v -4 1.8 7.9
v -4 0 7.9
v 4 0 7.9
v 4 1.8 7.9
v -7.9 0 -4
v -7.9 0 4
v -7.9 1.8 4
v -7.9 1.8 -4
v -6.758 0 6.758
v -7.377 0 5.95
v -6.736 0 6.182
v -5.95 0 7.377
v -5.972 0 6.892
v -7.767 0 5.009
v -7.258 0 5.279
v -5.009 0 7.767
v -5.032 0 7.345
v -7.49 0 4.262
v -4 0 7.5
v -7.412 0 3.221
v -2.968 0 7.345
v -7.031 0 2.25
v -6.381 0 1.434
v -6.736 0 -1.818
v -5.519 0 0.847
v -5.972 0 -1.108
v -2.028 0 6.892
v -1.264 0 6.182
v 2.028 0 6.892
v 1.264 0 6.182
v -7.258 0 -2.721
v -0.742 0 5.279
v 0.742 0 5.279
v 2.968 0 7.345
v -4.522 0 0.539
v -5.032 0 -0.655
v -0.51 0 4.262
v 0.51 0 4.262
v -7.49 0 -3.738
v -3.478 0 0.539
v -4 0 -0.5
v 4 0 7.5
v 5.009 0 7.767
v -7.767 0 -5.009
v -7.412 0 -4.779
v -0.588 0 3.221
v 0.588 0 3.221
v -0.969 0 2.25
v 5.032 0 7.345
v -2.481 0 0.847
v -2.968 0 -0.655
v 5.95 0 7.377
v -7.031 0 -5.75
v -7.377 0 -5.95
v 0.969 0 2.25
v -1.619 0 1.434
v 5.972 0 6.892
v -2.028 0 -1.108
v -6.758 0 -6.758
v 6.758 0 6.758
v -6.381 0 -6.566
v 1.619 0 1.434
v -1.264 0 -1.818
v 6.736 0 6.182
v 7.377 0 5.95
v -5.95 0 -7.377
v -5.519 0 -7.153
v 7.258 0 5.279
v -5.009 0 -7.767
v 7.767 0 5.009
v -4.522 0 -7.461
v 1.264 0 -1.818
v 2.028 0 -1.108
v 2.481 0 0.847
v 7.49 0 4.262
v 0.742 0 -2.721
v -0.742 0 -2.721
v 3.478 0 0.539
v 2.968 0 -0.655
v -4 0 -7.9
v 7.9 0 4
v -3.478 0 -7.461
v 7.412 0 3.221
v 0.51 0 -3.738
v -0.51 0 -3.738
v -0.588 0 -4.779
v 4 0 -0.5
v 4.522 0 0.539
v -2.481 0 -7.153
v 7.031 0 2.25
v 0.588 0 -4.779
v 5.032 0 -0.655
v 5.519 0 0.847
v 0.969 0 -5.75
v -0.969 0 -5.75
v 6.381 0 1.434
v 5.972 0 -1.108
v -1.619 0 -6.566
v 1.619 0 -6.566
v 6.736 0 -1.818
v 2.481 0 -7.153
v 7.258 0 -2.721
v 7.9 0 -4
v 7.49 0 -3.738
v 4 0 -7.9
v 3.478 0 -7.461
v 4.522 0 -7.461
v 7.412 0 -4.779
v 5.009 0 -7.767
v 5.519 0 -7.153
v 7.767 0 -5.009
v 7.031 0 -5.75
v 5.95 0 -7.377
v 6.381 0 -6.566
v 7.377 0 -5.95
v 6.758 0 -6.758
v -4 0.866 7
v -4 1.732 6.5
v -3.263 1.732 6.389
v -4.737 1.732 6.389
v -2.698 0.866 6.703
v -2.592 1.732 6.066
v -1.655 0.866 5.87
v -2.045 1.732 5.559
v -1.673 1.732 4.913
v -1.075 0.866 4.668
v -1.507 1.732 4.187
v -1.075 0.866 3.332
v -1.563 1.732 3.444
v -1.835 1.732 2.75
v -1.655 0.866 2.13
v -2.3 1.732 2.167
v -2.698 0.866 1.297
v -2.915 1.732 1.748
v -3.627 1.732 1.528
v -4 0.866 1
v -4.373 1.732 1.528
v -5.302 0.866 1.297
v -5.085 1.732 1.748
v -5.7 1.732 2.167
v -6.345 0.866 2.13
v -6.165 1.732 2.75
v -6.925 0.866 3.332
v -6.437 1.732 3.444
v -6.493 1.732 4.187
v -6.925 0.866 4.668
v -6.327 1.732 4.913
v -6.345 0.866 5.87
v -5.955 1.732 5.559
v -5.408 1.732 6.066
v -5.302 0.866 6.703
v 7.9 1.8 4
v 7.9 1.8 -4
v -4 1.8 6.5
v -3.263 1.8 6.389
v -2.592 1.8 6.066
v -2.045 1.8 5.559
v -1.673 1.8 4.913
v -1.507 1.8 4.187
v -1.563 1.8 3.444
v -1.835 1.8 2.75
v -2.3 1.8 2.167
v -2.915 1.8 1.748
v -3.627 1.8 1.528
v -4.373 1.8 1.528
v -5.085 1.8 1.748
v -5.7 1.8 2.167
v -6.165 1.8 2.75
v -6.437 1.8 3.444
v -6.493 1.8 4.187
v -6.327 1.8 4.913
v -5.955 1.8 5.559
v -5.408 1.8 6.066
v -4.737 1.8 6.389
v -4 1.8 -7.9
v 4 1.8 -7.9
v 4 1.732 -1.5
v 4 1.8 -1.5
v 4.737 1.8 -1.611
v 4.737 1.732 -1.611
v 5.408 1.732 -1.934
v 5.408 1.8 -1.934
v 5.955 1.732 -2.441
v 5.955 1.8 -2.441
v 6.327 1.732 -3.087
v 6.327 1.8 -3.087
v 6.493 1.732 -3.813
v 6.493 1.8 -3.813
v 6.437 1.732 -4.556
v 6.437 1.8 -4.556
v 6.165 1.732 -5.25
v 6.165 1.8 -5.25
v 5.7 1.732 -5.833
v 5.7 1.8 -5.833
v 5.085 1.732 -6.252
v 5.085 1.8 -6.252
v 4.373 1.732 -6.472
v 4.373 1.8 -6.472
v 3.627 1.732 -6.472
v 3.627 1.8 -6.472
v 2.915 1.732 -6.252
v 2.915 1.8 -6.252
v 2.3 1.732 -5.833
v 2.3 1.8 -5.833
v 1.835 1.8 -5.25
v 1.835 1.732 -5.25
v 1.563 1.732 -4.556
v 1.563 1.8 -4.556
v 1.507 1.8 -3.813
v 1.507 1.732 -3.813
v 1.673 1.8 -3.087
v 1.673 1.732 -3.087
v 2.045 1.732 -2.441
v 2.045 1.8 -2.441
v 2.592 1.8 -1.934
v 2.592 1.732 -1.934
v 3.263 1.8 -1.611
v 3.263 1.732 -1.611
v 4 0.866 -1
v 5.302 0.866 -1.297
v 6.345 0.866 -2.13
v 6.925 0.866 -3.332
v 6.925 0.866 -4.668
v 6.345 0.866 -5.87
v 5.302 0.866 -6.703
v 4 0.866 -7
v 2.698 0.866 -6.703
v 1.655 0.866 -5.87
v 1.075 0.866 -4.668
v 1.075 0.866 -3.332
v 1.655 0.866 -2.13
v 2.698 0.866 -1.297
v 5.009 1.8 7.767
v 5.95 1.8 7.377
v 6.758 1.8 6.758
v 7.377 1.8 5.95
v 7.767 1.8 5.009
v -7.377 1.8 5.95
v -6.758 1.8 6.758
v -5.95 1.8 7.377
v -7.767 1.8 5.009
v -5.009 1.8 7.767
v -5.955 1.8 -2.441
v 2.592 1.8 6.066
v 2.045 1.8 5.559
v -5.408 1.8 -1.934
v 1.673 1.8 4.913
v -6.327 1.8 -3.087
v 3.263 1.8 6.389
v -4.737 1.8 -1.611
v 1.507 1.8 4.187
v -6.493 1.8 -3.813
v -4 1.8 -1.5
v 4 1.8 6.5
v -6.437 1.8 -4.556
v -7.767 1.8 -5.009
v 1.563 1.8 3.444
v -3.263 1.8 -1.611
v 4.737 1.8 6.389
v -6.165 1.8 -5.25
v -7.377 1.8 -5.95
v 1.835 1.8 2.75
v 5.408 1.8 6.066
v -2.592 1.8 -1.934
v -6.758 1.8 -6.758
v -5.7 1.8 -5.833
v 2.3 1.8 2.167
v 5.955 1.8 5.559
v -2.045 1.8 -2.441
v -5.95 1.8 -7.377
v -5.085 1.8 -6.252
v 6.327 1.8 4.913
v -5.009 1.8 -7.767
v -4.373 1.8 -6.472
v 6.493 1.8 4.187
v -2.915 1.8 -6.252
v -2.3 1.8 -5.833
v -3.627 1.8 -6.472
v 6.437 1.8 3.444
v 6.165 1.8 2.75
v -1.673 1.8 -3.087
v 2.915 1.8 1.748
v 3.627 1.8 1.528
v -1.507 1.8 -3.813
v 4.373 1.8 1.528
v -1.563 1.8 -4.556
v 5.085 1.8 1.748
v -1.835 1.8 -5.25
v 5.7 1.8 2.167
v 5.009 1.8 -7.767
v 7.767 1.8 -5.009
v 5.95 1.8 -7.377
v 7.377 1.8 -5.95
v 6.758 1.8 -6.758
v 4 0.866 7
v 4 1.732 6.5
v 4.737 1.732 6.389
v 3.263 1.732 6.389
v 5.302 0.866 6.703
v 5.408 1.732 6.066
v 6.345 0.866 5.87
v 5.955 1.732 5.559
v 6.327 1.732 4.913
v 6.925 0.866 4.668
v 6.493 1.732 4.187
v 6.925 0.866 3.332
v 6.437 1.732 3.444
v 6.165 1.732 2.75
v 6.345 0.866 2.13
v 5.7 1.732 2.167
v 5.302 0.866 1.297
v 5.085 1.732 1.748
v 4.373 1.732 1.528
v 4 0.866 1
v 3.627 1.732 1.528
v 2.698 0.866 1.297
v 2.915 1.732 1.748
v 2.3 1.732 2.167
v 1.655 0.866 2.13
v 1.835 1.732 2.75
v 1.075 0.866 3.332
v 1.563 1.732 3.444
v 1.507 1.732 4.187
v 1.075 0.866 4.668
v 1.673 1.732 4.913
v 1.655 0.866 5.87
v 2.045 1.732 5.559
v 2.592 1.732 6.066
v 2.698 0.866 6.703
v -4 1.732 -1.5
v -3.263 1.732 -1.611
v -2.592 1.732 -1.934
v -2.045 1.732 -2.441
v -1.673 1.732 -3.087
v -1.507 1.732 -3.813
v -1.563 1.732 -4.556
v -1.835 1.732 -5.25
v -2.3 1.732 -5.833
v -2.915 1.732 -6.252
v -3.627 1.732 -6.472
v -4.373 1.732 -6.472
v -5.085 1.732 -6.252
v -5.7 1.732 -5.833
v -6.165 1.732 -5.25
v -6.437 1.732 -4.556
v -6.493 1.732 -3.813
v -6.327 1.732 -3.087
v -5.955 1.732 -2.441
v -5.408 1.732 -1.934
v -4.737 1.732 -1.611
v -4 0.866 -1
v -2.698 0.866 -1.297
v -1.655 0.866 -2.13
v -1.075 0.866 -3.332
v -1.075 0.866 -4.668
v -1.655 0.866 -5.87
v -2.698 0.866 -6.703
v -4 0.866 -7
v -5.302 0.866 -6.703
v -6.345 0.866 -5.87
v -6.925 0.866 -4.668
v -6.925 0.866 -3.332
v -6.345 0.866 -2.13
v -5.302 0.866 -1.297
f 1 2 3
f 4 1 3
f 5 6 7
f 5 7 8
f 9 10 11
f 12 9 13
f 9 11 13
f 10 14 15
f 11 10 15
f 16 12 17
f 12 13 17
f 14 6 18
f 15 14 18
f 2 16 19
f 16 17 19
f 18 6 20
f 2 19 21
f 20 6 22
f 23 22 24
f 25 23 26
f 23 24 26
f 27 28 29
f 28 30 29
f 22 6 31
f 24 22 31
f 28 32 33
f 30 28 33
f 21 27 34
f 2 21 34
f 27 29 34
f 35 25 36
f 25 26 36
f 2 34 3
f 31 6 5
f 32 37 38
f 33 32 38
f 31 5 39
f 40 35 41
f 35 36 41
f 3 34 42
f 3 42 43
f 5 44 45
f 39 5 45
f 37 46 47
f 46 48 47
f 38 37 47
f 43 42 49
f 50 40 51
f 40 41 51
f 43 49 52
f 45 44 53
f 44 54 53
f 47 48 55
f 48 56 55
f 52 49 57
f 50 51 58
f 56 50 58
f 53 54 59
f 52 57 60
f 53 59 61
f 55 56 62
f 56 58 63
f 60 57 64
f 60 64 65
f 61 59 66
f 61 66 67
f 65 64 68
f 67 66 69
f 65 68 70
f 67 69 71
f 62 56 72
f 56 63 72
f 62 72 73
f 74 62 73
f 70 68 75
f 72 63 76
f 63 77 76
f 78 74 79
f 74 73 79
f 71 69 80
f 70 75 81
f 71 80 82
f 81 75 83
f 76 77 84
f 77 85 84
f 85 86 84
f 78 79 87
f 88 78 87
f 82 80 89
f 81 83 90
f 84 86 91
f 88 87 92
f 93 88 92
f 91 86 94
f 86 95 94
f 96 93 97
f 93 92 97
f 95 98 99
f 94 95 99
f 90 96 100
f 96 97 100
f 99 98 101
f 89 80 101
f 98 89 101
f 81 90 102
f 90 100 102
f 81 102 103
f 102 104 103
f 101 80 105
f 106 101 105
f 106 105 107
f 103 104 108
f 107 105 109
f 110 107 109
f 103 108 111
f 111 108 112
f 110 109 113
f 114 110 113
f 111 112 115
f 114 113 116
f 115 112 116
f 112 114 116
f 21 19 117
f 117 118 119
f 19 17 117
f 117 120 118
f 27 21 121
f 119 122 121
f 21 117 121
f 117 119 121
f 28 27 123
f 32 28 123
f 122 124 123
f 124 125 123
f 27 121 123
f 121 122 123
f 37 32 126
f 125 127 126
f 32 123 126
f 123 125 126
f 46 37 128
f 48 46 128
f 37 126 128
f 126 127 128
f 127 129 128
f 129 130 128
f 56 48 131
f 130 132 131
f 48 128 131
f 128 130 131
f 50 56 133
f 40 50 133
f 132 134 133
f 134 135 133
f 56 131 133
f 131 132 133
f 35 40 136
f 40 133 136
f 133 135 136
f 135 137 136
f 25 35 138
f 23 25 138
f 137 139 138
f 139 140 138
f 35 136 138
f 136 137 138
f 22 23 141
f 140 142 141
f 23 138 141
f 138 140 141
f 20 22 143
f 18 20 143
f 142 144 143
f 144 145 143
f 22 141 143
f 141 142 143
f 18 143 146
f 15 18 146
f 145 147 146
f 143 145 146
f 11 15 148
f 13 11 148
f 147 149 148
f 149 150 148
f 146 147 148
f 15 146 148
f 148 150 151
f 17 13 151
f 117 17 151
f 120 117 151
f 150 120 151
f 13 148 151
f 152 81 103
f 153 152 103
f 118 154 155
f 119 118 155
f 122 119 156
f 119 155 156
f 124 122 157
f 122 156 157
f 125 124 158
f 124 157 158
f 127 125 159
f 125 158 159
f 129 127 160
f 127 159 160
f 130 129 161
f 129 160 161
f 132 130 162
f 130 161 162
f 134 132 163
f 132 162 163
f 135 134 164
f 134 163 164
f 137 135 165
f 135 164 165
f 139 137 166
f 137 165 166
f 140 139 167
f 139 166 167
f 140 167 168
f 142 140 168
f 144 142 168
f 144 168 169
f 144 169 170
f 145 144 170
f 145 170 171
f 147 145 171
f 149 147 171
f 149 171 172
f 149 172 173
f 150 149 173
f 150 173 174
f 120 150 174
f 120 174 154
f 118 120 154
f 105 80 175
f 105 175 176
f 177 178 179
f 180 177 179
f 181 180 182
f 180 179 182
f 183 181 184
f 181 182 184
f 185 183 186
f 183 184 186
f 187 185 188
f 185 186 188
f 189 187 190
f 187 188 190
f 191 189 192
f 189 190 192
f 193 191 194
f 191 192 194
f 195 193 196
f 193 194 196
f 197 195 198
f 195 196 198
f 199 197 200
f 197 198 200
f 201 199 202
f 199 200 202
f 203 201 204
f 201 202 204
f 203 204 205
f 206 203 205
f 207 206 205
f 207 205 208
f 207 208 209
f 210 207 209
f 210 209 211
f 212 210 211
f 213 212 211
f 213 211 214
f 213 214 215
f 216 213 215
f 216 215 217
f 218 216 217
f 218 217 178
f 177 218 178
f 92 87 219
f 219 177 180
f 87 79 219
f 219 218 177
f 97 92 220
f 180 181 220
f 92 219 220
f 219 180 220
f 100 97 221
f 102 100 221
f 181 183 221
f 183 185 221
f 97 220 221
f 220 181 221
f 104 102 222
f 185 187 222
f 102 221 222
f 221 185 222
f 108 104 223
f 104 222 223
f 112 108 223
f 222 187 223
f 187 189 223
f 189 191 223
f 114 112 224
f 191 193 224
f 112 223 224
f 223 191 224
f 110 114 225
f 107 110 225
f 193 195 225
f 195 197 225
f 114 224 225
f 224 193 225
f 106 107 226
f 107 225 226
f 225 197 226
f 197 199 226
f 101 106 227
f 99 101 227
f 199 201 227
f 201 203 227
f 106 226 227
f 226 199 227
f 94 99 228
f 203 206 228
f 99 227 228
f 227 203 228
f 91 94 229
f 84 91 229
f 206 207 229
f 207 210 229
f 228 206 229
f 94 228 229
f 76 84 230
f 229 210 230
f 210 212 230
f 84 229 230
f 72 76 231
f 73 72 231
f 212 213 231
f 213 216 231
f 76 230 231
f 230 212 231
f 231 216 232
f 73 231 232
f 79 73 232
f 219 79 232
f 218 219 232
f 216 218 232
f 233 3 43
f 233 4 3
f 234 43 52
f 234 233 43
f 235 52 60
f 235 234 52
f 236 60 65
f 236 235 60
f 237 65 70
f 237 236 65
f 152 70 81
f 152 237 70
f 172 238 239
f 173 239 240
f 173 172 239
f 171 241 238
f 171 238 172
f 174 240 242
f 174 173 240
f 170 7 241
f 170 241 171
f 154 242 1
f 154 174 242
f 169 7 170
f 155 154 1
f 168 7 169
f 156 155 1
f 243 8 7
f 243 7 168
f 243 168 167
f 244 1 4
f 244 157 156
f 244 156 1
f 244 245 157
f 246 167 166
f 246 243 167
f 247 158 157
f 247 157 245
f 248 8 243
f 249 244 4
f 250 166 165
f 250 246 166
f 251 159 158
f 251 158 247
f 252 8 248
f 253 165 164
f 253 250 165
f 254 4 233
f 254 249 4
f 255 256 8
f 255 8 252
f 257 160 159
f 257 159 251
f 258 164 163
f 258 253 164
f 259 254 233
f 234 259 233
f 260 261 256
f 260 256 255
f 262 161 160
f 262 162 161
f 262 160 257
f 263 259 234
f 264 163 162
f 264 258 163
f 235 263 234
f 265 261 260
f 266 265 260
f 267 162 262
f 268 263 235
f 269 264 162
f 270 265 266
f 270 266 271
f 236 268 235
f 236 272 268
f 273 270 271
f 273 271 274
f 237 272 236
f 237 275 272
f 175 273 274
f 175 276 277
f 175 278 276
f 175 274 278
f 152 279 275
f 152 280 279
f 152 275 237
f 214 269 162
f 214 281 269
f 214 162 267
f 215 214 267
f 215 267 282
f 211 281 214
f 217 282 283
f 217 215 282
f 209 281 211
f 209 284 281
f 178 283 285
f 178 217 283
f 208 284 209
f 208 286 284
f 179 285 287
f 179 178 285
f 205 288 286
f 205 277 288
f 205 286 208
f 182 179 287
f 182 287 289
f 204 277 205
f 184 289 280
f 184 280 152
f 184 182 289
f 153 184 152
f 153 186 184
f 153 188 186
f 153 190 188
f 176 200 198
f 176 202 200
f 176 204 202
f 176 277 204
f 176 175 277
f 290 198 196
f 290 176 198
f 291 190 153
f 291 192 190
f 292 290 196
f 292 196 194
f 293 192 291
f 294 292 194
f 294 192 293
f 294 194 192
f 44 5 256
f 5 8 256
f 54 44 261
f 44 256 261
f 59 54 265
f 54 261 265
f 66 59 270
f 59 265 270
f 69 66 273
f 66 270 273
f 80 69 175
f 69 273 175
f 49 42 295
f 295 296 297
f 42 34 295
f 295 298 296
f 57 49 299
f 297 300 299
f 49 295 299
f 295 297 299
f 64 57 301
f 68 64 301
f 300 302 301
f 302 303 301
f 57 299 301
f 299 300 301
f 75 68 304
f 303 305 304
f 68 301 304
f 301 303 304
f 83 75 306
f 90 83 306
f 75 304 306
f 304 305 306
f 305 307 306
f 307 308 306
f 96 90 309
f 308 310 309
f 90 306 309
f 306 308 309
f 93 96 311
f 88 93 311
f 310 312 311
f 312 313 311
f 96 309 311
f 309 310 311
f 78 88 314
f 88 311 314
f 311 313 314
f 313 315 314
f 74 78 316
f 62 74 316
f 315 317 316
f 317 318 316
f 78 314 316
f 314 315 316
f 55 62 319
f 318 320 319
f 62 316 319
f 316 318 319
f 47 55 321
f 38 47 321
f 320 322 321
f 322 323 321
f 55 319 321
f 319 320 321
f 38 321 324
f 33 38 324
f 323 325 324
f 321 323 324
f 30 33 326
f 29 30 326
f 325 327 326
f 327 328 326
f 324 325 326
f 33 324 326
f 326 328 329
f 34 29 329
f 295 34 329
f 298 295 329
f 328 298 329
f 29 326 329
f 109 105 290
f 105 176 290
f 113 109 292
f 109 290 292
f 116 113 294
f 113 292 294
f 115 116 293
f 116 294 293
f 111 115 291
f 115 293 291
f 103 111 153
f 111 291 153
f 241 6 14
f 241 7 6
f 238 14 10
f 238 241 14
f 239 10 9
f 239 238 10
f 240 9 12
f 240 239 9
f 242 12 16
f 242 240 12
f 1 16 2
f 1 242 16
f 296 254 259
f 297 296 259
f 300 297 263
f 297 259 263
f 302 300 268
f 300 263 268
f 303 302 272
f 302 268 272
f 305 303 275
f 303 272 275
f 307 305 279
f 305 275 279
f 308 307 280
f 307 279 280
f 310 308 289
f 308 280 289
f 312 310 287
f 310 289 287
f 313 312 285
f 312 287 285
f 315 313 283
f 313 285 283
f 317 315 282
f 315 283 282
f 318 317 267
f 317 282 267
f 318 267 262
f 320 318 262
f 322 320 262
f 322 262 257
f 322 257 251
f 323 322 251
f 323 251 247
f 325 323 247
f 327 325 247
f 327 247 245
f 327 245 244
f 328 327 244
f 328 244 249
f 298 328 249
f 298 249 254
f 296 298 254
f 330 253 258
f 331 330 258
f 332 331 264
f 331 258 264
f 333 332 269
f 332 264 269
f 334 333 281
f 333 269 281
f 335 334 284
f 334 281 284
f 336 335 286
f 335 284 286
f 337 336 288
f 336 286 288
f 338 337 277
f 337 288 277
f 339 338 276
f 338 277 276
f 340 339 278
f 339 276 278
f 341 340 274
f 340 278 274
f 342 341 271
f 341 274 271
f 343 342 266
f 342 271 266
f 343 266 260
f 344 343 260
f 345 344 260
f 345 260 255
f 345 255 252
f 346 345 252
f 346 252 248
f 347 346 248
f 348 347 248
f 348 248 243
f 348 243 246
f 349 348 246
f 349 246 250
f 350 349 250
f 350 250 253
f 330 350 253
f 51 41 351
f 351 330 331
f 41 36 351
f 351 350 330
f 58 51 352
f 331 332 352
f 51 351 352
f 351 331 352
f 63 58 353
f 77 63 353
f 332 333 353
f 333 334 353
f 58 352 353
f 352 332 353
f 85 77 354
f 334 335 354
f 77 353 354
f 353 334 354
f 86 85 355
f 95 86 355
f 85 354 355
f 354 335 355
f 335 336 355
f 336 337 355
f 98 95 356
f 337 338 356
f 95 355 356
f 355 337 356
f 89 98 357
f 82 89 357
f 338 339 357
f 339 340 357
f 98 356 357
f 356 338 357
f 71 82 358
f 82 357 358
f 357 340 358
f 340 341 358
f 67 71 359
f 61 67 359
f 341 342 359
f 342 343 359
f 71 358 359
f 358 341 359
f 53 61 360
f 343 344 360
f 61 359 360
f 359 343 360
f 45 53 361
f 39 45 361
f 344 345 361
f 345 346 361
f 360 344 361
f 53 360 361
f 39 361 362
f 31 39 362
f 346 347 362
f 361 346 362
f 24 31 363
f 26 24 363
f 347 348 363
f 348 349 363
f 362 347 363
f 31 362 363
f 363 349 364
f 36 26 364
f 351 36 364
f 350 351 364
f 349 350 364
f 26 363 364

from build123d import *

# Parameters (mm, degrees)
SKETCH1_W           = 15.8
SKETCH1_H           = 15.8
BOSS_EXTRUDE1_DEPTH = 1.8
CUT_EXTRUDE1_REACH  = 13.316
SKETCH2_R           = 2.5
FILLET1_R           = 3.9
CHAMFER1_SIZE       = 1
CHAMFER1_SIZE2      = 1.732050808


with BuildPart() as part:
    # Sketch1 → Boss-Extrude1 (new body)
    with BuildSketch(Plane(origin=(0, 0, 0), x_dir=(1, 0, 0), z_dir=(0, 1, 0))):
        Rectangle(SKETCH1_W, SKETCH1_H)
    extrude(amount=BOSS_EXTRUDE1_DEPTH)

    # Sketch2 → Cut-Extrude1 (cut, up to next)
    with BuildSketch(Plane(origin=(0, 1.8, 0), x_dir=(1, 0, 0), z_dir=(0, 1, 0)), mode=Mode.PRIVATE) as cut_extrude1_sk1:
        with Locations(Location((-4, 4, 0), (0, 0, 270))):
            Circle(SKETCH2_R)
    cut_extrude1_tool1 = extrude(cut_extrude1_sk1.sketch, amount=-CUT_EXTRUDE1_REACH, mode=Mode.PRIVATE) & part.part
    # Sketch2 → Cut-Extrude1 (cut, up to next)
    with BuildSketch(Plane(origin=(0, 1.8, 0), x_dir=(1, 0, 0), z_dir=(0, 1, 0)), mode=Mode.PRIVATE) as cut_extrude1_sk2:
        with Locations(Location((4, 4, 0), (0, 0, 270))):
            Circle(SKETCH2_R)
    cut_extrude1_tool2 = extrude(cut_extrude1_sk2.sketch, amount=-CUT_EXTRUDE1_REACH, mode=Mode.PRIVATE) & part.part
    # Sketch2 → Cut-Extrude1 (cut, up to next)
    with BuildSketch(Plane(origin=(0, 1.8, 0), x_dir=(1, 0, 0), z_dir=(0, 1, 0)), mode=Mode.PRIVATE) as cut_extrude1_sk3:
        with Locations(Location((4, -4, 0), (0, 0, 270))):
            Circle(SKETCH2_R)
    cut_extrude1_tool3 = extrude(cut_extrude1_sk3.sketch, amount=-CUT_EXTRUDE1_REACH, mode=Mode.PRIVATE) & part.part
    # Sketch2 → Cut-Extrude1 (cut, up to next)
    with BuildSketch(Plane(origin=(0, 1.8, 0), x_dir=(1, 0, 0), z_dir=(0, 1, 0)), mode=Mode.PRIVATE) as cut_extrude1_sk4:
        with Locations(Location((-4, -4, 0), (0, 0, 270))):
            Circle(SKETCH2_R)
    cut_extrude1_tool4 = extrude(cut_extrude1_sk4.sketch, amount=-CUT_EXTRUDE1_REACH, mode=Mode.PRIVATE) & part.part
    add(cut_extrude1_tool1.solids().sort_by_distance((-4, 1.8, -4))[0], mode=Mode.SUBTRACT)
    add(cut_extrude1_tool2.solids().sort_by_distance((4, 1.8, -4))[0], mode=Mode.SUBTRACT)
    add(cut_extrude1_tool3.solids().sort_by_distance((4, 1.8, 4))[0], mode=Mode.SUBTRACT)
    add(cut_extrude1_tool4.solids().sort_by_distance((-4, 1.8, 4))[0], mode=Mode.SUBTRACT)

    # Fillet1
    fillet1_edges = [part.edges().sort_by_distance(p)[0] for p in [
        (-7.9, 0.9, -7.9),
        (7.9, 0.9, -7.9),
        (7.9, 0.9, 7.9),
        (-7.9, 0.9, 7.9),
    ]]
    fillet(fillet1_edges, radius=FILLET1_R)

    # Chamfer1
    chamfer1_edges = [part.edges().sort_by_distance(p)[0] for p in [
        (-4, 0, 1.5),
        (4, 0, 1.5),
        (4, 0, -6.5),
        (-4, 0, -6.5),
    ]]
    chamfer1_side = [part.faces().sort_by_distance(p)[0] for p in [
        (0, 0, 0),
    ]]
    chamfer(chamfer1_edges, length=CHAMFER1_SIZE, length2=CHAMFER1_SIZE2, reference=chamfer1_side[0])


solid = part.part
